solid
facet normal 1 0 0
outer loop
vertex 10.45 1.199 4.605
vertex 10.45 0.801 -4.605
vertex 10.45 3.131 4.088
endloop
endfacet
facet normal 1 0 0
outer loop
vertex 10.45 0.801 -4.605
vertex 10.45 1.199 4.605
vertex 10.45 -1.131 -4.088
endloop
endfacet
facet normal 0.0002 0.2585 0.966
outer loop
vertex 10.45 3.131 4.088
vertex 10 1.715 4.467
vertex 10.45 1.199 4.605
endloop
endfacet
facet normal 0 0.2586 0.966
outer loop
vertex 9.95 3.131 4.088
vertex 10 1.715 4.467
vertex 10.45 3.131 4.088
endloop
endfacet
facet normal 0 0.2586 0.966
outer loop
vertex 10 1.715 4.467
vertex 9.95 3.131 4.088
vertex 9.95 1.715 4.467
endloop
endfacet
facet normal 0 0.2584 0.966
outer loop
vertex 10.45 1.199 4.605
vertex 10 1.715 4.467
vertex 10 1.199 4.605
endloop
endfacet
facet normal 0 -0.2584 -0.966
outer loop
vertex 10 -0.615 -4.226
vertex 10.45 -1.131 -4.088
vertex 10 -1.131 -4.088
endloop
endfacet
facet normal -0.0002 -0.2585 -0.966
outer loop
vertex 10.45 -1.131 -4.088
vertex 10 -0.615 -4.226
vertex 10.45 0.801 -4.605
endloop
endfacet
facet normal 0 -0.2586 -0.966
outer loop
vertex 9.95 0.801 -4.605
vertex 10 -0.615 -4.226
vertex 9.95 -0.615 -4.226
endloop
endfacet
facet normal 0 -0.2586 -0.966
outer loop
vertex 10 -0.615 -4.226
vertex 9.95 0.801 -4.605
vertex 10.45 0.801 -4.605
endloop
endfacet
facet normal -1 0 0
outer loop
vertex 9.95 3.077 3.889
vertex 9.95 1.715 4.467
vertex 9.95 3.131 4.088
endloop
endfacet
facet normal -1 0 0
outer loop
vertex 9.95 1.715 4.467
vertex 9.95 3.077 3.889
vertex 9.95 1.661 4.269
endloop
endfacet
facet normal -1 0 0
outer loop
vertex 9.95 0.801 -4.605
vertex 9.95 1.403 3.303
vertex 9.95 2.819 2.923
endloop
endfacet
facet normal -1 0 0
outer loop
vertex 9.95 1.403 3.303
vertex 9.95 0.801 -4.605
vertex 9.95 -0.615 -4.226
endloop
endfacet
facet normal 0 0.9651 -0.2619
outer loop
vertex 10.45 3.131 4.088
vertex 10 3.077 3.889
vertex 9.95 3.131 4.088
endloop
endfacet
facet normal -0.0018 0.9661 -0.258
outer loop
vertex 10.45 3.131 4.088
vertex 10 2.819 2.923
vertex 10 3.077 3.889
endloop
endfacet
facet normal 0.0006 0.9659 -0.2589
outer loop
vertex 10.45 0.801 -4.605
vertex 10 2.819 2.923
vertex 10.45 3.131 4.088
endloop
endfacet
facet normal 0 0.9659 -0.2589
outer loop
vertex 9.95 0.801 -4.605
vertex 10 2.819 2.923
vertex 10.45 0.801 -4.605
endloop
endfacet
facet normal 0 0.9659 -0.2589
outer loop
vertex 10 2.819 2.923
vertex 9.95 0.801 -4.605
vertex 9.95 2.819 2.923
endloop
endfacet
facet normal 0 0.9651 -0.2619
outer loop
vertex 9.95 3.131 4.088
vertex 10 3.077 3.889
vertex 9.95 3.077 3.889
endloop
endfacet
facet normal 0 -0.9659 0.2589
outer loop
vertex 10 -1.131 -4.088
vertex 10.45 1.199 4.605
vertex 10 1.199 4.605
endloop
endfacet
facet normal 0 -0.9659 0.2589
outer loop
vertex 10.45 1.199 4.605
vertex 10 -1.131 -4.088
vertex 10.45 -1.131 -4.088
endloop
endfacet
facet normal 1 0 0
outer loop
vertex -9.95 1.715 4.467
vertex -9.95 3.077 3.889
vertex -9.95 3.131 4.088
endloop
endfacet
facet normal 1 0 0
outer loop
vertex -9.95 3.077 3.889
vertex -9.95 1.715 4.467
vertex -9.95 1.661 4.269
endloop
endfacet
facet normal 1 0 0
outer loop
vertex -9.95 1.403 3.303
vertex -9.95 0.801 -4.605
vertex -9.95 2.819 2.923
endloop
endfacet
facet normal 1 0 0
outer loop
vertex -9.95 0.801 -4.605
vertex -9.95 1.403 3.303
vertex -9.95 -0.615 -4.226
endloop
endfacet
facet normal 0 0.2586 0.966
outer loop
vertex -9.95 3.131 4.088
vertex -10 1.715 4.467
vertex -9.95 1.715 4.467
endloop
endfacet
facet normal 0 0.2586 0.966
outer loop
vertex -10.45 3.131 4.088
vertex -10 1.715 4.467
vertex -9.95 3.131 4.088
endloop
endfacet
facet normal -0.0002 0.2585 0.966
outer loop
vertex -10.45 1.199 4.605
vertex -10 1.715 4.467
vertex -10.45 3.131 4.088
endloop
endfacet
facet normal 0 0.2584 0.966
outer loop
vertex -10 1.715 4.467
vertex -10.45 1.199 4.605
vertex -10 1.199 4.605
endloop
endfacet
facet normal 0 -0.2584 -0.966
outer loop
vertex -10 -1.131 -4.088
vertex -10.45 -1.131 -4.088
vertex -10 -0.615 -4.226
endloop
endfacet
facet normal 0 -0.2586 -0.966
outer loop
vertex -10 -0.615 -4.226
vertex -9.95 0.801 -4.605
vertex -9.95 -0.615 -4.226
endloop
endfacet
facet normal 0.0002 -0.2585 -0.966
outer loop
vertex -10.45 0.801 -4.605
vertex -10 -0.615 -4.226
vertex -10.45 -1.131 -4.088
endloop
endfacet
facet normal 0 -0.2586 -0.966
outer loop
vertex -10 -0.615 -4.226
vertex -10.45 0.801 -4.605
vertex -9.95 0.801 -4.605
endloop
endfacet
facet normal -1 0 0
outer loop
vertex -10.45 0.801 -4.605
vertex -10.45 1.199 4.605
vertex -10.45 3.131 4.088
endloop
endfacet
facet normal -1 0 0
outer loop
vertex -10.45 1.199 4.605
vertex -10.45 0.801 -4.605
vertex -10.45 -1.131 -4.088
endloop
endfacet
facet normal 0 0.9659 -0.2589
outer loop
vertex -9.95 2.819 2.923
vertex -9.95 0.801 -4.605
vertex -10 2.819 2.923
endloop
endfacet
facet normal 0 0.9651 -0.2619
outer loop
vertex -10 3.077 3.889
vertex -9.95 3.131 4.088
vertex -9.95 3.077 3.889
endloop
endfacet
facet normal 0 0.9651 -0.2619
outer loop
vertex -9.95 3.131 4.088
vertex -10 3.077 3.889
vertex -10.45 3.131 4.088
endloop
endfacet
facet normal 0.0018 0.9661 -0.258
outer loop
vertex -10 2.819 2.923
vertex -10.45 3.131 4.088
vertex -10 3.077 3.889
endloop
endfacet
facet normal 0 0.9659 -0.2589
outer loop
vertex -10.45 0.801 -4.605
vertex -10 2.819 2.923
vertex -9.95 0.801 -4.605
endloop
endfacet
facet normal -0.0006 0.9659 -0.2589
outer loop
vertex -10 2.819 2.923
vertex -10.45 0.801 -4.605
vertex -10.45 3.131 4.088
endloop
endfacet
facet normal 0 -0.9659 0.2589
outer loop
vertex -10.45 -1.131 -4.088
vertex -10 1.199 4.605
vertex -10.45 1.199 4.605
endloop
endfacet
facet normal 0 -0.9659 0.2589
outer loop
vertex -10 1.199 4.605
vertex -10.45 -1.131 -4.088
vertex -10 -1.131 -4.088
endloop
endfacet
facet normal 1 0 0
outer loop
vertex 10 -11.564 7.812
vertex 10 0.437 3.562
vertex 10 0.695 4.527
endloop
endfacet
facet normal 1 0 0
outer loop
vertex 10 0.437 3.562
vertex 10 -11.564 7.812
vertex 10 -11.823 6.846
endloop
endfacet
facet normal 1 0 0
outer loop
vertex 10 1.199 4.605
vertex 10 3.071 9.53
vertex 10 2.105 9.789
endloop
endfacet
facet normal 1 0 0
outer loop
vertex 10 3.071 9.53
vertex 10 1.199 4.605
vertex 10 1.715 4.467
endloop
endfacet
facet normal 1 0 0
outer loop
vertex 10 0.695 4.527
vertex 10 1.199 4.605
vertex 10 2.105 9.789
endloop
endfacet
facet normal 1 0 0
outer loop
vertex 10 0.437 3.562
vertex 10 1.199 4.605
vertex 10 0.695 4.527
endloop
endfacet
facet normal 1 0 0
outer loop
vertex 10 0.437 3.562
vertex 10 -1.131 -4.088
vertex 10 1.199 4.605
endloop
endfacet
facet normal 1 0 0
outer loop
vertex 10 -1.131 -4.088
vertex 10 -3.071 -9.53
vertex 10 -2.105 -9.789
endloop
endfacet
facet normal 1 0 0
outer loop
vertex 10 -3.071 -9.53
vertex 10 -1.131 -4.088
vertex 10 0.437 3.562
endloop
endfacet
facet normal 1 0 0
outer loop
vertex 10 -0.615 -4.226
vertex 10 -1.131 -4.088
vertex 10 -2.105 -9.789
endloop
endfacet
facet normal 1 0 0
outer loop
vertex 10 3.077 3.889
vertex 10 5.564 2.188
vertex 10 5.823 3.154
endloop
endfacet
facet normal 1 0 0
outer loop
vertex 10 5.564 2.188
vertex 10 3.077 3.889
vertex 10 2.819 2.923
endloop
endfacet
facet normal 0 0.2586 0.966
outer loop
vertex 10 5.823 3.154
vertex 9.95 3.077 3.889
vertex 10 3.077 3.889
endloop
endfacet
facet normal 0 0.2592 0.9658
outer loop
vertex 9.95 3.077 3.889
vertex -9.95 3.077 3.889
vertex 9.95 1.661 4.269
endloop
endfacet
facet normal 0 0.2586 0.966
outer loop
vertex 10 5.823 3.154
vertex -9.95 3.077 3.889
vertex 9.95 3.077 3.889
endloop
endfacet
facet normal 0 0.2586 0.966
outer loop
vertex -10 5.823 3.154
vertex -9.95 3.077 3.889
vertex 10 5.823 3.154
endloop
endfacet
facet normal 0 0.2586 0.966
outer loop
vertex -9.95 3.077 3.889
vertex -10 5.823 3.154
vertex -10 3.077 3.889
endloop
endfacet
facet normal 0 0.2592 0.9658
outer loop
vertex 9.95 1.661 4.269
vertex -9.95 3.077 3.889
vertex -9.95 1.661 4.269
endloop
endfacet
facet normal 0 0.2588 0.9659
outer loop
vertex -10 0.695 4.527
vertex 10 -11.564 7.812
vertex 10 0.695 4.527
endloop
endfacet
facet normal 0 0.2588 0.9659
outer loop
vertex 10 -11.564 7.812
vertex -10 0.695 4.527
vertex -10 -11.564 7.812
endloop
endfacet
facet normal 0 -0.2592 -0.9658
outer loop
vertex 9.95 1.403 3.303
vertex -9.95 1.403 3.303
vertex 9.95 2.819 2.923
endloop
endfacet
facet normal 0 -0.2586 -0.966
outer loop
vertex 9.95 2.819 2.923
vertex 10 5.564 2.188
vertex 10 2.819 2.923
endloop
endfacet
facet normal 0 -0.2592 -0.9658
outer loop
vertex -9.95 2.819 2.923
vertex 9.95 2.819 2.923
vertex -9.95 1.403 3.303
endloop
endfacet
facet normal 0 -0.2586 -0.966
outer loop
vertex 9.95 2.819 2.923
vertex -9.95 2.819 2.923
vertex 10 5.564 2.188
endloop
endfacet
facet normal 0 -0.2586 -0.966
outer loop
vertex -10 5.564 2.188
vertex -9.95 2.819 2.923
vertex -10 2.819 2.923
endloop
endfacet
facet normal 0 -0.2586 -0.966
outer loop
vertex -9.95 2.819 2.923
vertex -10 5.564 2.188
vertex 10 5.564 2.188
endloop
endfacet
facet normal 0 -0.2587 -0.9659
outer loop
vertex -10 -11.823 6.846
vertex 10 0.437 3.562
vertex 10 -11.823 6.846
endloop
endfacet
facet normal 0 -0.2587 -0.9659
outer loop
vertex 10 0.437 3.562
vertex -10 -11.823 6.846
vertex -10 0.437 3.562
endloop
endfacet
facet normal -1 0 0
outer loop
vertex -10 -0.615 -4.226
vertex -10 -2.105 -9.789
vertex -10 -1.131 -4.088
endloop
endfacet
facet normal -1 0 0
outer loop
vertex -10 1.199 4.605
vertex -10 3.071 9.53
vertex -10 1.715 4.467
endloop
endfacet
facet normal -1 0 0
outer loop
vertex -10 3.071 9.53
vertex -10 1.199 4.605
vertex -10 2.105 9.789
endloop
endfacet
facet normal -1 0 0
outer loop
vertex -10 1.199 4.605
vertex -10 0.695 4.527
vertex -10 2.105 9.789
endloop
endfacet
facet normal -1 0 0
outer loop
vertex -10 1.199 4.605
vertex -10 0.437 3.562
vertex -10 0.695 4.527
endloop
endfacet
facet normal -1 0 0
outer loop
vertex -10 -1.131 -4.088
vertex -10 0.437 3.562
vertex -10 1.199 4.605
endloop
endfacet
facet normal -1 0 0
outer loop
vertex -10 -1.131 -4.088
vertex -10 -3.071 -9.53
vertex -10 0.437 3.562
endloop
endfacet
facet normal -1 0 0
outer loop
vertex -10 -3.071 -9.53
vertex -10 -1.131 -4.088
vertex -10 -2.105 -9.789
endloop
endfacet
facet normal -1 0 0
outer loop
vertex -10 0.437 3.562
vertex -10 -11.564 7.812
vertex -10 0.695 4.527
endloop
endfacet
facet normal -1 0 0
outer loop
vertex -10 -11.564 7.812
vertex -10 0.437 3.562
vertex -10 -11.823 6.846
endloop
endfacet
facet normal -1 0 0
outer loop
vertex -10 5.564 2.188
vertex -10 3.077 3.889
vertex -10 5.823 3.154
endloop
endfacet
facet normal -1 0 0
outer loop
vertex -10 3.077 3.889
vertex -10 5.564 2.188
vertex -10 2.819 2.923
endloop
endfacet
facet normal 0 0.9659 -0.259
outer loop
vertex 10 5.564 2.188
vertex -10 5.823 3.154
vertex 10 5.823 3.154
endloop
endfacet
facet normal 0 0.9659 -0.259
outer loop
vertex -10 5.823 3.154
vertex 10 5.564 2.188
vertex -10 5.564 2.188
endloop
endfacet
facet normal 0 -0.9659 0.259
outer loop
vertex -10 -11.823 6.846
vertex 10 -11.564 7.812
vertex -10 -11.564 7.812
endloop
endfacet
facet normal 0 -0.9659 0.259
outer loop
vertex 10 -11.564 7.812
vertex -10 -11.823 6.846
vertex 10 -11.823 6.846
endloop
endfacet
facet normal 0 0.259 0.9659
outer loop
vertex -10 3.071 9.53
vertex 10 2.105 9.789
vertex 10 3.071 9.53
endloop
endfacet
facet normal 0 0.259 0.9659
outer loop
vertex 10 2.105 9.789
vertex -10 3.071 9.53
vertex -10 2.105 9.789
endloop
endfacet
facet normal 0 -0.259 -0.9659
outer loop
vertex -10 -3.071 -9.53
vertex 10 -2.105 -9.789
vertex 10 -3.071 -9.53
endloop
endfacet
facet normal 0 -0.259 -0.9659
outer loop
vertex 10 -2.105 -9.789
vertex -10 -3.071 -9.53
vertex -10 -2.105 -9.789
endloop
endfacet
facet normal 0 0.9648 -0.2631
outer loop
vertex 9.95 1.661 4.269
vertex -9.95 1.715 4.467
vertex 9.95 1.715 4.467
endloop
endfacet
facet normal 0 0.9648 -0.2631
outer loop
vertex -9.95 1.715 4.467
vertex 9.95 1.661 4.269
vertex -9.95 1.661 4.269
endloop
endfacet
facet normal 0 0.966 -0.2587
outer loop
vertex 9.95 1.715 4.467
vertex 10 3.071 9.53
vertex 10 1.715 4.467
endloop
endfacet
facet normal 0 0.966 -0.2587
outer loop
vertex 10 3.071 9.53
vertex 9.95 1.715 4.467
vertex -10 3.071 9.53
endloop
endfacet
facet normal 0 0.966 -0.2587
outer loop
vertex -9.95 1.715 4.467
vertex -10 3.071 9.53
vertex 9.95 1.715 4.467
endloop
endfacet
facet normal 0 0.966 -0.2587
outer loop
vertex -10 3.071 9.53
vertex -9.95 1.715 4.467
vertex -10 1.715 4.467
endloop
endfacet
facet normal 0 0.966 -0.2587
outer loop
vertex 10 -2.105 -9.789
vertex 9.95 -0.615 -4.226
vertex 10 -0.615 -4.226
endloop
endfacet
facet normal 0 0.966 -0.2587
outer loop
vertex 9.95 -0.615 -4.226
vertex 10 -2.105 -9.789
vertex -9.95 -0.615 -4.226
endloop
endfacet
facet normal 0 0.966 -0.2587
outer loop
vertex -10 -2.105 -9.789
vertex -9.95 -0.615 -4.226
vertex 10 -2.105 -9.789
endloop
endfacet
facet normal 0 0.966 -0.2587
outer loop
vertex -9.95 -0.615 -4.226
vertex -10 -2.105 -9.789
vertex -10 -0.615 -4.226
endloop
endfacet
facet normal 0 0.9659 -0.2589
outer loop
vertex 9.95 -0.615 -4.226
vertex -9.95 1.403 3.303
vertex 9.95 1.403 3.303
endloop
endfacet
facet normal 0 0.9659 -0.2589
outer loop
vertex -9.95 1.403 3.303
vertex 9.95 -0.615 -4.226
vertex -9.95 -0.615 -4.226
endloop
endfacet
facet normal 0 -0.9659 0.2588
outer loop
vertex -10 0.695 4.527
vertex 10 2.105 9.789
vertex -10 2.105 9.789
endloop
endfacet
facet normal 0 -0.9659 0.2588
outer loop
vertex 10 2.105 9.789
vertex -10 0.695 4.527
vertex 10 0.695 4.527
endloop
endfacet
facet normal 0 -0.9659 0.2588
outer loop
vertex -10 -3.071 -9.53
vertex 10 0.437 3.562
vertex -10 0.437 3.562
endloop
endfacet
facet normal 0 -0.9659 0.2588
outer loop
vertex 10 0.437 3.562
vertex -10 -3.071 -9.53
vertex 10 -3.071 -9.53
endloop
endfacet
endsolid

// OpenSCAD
height_phone = 20; 
width_phone = 20; 
rotation = -15; 

translate([width_phone/2+0.2,1, 0])
rotate([rotation, 0, 0])
cube([0.5, 2, height_phone/2-1], center=true);
translate([-width_phone/2-0.2,1, 0])
rotate([rotation, 0, 0])
cube([0.5, 2, height_phone/2-1], center=true);
translate([0, -3, 5])
rotate([rotation, 0, 0])
cube([width_phone, 18, 1], center=true);
rotate([rotation, 0, 0])
cube([width_phone, 1, height_phone], center=true);
